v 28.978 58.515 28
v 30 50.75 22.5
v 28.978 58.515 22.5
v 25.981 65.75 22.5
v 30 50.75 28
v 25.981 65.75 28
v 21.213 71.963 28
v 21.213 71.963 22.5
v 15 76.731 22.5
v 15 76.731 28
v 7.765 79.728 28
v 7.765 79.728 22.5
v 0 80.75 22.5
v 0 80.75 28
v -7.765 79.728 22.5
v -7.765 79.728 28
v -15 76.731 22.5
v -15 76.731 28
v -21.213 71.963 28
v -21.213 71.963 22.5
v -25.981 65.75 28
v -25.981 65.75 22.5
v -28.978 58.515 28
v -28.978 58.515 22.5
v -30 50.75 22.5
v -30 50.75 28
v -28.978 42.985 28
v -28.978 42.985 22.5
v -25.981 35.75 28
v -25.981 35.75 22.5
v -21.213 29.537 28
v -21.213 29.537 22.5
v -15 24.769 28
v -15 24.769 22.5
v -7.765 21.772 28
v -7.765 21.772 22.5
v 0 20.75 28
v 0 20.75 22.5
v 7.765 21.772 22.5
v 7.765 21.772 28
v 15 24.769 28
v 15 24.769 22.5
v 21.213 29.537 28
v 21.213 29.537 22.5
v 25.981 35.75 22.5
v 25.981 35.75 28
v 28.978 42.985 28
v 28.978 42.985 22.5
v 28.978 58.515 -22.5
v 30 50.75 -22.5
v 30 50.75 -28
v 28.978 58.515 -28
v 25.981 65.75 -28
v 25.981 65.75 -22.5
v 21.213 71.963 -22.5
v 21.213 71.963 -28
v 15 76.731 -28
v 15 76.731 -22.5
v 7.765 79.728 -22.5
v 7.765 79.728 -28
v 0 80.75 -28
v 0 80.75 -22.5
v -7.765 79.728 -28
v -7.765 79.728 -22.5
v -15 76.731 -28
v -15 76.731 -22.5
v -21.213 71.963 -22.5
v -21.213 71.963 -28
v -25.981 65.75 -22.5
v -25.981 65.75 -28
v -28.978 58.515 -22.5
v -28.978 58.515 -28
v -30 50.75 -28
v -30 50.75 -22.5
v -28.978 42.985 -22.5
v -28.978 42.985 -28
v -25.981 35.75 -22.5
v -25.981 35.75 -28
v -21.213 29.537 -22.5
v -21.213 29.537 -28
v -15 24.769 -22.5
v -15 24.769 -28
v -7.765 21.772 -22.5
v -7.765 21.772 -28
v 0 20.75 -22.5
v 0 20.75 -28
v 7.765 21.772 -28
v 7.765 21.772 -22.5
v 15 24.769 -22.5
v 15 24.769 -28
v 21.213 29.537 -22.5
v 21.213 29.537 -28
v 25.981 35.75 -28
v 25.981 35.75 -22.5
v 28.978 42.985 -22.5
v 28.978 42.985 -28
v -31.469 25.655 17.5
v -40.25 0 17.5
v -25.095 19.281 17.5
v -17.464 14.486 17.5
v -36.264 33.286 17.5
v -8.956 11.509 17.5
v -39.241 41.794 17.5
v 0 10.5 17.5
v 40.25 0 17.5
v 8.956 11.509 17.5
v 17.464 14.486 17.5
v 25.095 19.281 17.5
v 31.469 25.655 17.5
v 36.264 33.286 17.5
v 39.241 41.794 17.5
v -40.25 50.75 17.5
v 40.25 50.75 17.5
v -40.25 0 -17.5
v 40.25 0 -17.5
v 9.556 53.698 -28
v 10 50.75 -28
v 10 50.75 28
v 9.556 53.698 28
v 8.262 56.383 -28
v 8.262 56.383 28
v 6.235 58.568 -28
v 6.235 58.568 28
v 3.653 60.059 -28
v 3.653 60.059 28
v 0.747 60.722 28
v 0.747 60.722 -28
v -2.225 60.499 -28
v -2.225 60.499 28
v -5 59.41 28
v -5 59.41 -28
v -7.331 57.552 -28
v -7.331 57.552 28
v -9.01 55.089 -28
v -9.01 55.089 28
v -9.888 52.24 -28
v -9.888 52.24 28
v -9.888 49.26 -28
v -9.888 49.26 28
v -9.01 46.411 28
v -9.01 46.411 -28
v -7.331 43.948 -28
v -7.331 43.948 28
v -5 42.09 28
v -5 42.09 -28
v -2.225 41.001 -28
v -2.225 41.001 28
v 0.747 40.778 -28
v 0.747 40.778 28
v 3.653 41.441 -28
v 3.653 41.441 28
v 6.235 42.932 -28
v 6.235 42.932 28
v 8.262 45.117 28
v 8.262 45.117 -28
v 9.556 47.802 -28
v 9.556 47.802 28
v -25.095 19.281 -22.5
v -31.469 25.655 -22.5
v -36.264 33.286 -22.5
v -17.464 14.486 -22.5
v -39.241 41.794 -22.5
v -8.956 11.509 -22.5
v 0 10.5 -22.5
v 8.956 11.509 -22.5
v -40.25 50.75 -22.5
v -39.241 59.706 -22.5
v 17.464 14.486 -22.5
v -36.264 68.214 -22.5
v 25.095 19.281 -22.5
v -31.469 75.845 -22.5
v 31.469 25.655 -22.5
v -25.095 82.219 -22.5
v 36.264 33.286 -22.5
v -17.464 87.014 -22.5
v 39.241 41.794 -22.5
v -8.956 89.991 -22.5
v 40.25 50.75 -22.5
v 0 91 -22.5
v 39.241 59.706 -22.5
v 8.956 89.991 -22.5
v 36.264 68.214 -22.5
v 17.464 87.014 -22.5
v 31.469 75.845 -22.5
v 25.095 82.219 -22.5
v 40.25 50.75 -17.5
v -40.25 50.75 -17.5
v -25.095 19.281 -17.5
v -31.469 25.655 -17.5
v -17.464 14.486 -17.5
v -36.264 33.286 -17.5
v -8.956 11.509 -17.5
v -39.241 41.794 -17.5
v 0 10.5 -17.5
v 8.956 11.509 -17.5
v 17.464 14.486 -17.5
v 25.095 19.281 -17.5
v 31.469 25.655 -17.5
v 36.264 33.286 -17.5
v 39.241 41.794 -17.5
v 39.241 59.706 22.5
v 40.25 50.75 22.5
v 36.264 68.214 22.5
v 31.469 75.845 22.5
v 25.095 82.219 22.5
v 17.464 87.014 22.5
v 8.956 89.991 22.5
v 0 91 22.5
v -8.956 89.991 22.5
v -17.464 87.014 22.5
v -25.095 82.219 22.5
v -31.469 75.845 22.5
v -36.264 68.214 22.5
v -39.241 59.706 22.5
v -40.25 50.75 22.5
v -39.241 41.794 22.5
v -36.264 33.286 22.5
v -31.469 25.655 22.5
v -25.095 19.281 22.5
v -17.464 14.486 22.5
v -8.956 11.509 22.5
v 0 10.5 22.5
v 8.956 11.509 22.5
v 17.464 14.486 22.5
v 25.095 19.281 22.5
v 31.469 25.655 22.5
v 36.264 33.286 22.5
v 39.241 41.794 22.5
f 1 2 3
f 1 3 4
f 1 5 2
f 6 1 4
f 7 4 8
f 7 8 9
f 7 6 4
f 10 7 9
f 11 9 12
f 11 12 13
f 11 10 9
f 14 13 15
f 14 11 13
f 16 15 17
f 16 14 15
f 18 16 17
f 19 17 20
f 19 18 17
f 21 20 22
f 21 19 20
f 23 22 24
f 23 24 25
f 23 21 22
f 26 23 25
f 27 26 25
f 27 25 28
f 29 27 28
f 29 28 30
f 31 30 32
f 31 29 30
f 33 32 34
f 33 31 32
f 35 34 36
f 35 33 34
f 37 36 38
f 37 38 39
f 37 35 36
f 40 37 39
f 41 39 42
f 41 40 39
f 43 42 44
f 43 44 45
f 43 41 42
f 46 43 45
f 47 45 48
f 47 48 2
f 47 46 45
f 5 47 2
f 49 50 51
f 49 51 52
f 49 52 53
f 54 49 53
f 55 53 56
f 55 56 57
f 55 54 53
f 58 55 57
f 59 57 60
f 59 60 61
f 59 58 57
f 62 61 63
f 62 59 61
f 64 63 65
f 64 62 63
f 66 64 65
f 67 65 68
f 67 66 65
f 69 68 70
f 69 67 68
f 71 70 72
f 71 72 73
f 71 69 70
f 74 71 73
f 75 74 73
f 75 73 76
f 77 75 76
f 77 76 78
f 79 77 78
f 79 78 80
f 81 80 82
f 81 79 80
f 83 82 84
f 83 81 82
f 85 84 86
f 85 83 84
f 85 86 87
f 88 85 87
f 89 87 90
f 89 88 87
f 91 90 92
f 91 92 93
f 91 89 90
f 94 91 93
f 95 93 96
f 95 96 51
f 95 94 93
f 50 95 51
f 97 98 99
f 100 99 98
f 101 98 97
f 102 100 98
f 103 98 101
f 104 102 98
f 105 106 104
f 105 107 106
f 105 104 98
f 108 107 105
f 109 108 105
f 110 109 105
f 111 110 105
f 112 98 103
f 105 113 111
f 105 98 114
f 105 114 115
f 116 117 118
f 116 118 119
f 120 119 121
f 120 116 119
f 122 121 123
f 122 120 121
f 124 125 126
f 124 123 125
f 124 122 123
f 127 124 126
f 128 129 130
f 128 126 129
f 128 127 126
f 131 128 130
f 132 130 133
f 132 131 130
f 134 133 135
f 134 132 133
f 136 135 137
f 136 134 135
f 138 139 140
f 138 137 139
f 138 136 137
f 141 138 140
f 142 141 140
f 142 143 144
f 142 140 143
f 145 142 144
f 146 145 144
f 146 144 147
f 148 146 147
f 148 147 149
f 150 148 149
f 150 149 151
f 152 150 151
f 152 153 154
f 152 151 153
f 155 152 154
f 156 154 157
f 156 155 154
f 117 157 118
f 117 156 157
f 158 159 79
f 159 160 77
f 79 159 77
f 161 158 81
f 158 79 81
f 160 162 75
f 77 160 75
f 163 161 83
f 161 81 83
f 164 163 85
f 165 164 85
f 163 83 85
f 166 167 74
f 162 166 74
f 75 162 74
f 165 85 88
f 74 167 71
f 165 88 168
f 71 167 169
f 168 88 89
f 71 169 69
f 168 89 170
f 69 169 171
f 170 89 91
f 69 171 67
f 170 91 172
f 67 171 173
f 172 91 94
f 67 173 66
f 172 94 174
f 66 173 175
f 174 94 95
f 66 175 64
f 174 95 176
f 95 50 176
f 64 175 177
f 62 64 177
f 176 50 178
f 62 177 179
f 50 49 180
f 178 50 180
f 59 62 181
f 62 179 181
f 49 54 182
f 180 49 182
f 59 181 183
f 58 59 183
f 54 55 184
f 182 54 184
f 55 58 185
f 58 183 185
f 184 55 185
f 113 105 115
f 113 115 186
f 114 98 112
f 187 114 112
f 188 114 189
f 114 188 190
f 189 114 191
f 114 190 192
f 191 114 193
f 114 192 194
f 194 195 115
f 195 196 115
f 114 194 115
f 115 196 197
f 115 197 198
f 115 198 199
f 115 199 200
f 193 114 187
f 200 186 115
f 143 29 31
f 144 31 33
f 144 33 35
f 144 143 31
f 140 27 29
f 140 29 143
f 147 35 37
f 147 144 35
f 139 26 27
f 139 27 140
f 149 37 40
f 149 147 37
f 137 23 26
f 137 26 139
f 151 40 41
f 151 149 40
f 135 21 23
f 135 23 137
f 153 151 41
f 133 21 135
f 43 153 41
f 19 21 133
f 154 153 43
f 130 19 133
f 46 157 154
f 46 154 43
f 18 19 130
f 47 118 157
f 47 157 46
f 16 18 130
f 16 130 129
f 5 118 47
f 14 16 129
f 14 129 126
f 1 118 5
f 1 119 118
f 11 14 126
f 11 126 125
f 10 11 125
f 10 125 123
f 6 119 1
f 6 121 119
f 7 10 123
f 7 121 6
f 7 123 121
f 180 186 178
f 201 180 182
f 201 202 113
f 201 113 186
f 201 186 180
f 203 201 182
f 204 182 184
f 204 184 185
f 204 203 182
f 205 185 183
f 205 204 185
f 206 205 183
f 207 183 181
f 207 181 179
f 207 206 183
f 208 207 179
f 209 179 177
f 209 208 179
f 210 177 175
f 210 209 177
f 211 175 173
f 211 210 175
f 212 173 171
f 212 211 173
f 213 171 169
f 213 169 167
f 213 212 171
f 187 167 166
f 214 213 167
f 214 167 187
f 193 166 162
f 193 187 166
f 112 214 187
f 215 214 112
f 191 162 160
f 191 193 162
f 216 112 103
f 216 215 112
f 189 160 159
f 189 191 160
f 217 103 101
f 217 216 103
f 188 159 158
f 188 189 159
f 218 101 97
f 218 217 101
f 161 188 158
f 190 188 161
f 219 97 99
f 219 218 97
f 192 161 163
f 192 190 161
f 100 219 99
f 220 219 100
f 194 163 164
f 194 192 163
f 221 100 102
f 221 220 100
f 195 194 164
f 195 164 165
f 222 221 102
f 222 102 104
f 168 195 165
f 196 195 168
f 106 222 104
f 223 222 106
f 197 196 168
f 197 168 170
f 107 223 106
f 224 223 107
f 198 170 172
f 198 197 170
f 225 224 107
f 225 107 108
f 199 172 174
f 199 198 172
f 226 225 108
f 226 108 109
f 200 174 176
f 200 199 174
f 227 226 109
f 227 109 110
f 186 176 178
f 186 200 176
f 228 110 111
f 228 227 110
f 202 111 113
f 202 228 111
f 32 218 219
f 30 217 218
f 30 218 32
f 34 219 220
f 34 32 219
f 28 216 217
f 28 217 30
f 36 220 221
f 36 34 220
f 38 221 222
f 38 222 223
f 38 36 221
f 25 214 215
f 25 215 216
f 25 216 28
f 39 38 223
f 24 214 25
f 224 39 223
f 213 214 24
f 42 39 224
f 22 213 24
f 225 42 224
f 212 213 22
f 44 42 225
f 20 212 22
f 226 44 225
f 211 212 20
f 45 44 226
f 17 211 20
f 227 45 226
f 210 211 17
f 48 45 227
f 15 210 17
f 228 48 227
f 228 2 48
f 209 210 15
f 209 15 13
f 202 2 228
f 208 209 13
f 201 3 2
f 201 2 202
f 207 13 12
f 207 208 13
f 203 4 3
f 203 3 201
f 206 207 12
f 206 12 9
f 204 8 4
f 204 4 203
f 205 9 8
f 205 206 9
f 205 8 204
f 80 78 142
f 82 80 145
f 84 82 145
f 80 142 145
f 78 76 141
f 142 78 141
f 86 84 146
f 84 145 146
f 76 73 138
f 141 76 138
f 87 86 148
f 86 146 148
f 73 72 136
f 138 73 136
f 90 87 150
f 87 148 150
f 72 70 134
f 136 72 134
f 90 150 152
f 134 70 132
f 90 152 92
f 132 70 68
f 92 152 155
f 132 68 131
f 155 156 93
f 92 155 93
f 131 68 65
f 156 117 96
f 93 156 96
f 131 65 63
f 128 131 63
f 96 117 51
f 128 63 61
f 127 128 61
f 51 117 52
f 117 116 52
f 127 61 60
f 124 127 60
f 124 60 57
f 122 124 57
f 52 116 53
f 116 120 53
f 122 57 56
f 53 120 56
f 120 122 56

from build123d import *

# Parameters (mm, degrees)
SKETCH1_W               = 80.5
SKETCH1_H               = 50.75
BOSS_EXTRUDE1_DEPTH     = 17.5
SKETCH2_R               = 40.25
BOSS_EXTRUDE2_DEPTH     = 22.5
SKETCH3_R               = 30
BOSS_EXTRUDE3_DEPTH     = 28
CUT_EXTRUDE1_DEPTH      = 104.368575979
CUT_EXTRUDE1_DEPTH_BACK = 104.368575979
SKETCH4_R               = 10


with BuildPart() as part:
    # Sketch1 → Boss-Extrude1 (new, symmetric)
    with BuildSketch(Plane.XY):
        with Locations((0, 25.375)):
            Rectangle(SKETCH1_W, SKETCH1_H)
    extrude(amount=BOSS_EXTRUDE1_DEPTH, both=True)

    # Sketch2 → Boss-Extrude2 (add, symmetric)
    with BuildSketch(Plane.XY):
        with Locations((0, 50.75)):
            Circle(SKETCH2_R)
    extrude(amount=BOSS_EXTRUDE2_DEPTH, both=True)

    # Sketch3 → Boss-Extrude3 (add, symmetric)
    with BuildSketch(Plane.XY):
        with Locations((0, 50.75)):
            Circle(SKETCH3_R)
    extrude(amount=BOSS_EXTRUDE3_DEPTH, both=True)

    # Sketch4 → Cut-Extrude1 (cut, two sides: drawn at the far end of the back side and taken through both)
    with BuildSketch(Plane.XY.offset(-CUT_EXTRUDE1_DEPTH_BACK)):
        with Locations((0, 50.75)):
            Circle(SKETCH4_R)
    extrude(amount=CUT_EXTRUDE1_DEPTH + CUT_EXTRUDE1_DEPTH_BACK, mode=Mode.SUBTRACT)


solid = part.part
